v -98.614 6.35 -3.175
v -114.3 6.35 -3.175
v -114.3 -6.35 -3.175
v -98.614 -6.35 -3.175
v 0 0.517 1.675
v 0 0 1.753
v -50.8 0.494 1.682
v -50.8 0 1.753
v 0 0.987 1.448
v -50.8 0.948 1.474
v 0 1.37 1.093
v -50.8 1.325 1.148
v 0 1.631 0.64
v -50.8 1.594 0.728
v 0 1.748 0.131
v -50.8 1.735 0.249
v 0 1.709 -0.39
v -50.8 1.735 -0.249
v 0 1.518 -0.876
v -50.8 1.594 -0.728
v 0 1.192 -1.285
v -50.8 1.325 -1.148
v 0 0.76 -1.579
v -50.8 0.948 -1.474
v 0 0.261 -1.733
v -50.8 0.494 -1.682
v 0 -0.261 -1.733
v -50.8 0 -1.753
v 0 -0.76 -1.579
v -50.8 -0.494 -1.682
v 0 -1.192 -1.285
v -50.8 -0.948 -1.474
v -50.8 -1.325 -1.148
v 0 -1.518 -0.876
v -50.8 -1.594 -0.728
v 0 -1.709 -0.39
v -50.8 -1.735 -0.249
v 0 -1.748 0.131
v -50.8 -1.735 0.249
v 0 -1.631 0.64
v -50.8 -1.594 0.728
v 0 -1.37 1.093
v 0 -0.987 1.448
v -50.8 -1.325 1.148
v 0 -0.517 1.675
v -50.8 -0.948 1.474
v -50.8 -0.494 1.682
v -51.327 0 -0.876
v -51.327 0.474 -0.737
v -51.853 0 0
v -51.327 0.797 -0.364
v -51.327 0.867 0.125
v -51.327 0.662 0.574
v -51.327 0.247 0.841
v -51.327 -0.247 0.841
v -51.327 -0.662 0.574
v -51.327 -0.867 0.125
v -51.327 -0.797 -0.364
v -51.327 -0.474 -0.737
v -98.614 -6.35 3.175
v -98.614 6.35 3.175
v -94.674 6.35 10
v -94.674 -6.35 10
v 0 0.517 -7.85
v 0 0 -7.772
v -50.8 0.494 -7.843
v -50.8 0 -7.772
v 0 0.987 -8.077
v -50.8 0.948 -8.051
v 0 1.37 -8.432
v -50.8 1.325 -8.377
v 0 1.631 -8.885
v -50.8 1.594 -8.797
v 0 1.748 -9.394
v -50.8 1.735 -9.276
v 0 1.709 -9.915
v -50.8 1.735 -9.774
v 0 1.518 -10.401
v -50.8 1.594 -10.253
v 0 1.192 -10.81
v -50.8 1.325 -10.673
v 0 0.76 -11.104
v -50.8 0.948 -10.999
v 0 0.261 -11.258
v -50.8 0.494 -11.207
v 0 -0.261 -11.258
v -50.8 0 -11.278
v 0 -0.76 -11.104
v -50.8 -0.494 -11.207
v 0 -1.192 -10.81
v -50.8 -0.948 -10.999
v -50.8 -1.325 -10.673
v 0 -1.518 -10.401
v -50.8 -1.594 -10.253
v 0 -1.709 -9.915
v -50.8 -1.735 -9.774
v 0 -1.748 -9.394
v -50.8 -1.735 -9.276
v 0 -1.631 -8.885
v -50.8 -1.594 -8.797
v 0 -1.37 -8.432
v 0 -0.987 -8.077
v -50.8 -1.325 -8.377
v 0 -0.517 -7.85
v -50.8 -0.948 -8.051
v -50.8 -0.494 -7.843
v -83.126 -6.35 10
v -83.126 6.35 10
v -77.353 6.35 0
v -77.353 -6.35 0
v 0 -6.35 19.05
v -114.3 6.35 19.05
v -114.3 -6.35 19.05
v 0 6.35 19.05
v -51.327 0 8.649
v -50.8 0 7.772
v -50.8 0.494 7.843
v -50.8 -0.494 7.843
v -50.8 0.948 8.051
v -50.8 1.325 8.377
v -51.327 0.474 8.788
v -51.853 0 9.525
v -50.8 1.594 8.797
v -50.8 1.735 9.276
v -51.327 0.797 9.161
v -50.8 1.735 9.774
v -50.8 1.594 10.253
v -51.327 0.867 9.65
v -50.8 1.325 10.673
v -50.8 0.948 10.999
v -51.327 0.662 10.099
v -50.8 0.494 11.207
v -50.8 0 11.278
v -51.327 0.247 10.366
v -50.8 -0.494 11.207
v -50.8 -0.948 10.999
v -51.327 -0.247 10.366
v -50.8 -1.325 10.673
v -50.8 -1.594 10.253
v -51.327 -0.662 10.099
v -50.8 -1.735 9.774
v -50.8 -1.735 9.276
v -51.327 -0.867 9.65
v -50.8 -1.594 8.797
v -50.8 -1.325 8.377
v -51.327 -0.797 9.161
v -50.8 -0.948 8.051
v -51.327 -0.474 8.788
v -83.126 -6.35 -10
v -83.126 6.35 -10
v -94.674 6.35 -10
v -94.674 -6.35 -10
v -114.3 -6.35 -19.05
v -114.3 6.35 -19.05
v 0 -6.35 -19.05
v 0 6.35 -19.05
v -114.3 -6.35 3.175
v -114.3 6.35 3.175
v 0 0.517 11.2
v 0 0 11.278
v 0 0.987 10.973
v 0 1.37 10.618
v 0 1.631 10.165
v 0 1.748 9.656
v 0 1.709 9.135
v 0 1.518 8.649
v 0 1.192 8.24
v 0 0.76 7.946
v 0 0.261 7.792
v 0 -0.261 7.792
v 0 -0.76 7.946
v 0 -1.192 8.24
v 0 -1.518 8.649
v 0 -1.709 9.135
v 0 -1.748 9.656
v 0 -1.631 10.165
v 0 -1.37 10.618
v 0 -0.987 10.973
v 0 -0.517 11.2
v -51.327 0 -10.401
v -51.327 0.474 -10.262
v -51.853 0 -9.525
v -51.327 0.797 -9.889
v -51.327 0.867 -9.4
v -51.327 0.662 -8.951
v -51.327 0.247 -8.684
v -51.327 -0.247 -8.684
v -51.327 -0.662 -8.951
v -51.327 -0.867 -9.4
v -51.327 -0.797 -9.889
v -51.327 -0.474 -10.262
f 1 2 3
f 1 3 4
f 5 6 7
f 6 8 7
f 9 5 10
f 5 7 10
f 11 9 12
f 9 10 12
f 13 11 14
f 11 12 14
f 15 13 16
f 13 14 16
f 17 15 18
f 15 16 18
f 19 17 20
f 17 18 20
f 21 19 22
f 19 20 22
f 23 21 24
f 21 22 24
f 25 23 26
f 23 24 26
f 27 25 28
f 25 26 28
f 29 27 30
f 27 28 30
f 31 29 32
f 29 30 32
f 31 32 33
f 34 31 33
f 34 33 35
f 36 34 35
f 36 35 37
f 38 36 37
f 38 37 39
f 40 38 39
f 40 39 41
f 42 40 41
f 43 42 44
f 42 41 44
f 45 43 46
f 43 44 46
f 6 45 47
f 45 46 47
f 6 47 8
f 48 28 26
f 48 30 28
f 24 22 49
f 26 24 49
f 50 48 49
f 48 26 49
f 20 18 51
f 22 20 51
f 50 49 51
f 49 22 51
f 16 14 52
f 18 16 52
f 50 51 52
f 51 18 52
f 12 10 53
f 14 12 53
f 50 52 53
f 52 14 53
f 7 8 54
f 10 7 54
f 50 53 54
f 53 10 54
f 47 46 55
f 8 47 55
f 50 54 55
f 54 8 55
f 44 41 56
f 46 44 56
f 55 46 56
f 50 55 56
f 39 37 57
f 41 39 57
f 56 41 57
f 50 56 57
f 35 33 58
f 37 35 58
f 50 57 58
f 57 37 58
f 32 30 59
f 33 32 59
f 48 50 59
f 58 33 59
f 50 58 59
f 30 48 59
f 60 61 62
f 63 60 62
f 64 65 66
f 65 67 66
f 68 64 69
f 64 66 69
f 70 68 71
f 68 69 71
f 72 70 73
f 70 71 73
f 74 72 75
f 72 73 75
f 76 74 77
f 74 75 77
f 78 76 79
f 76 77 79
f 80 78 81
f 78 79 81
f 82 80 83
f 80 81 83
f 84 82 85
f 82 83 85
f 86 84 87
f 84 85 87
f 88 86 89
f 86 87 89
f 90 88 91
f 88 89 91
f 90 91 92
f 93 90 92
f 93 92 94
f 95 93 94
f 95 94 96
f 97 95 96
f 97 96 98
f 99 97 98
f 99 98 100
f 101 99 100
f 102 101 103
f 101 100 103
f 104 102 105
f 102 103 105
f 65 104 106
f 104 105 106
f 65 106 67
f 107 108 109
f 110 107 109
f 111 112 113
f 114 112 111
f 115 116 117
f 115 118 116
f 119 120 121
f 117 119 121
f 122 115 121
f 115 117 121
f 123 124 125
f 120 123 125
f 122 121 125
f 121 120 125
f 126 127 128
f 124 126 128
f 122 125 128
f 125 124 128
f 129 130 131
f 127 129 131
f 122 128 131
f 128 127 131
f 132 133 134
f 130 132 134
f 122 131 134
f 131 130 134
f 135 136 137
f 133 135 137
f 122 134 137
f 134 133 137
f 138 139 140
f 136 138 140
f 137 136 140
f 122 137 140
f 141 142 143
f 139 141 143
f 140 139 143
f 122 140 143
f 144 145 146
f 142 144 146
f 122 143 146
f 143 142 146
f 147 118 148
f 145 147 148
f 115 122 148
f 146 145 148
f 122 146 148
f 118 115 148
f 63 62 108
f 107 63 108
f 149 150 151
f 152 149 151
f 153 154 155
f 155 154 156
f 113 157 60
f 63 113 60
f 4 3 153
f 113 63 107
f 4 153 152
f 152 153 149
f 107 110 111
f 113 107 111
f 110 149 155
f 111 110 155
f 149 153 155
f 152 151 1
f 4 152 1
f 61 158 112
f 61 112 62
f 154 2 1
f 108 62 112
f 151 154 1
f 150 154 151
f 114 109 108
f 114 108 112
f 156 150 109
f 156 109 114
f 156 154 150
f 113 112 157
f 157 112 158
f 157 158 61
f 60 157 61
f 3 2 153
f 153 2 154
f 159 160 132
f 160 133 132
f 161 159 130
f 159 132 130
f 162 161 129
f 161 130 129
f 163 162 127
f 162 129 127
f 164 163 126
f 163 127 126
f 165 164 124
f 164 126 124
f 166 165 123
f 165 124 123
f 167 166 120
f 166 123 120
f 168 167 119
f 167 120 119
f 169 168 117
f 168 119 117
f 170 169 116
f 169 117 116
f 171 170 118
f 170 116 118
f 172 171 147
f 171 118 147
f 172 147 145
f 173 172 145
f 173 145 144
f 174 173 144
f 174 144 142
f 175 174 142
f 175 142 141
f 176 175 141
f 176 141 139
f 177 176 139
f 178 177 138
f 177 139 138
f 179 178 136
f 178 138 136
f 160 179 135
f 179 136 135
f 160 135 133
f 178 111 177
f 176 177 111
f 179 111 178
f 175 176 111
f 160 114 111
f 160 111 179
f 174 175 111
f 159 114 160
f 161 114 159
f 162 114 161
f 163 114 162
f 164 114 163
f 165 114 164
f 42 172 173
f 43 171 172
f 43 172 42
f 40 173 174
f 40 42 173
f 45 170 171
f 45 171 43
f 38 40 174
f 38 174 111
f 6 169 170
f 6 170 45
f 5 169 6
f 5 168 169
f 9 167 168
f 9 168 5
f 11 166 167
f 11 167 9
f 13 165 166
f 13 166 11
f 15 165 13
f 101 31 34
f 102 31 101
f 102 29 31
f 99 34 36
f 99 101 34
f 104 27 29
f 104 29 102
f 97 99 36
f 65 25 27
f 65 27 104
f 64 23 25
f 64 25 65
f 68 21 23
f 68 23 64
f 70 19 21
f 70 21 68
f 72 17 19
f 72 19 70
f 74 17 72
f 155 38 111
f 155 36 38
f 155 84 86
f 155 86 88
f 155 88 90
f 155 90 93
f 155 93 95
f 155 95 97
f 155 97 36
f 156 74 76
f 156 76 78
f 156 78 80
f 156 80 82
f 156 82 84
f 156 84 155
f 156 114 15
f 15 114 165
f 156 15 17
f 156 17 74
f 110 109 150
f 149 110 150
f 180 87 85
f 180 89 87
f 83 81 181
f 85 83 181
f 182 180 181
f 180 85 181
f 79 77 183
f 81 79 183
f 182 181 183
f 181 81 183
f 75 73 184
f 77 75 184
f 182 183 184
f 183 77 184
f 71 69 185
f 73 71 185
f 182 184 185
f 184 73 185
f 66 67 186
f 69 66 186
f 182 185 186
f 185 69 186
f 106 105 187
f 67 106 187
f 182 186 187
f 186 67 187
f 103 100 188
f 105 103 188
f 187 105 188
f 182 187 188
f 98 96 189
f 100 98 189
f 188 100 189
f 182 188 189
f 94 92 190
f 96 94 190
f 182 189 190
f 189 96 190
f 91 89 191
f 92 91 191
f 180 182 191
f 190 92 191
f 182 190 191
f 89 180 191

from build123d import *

# Parameters (mm, degrees)
SKETCH1_W                  = 114.3
SKETCH1_H                  = 38.1
BOSS_EXTRUDE1_DEPTH        = 6.35
F_6_32_THREADED_HOLE_D     = 3.5052
F_6_32_THREADED_HOLE_DEPTH = 50.8
F_6_32_THREADED_HOLE_TIP   = 1.053068321
CUT_EXTRUDE1_DEPTH         = 12.7
SKETCH8_W                  = 19.626497308
SKETCH8_H                  = 6.35
CUT_EXTRUDE2_DEPTH         = 117.570504417


with BuildPart() as part:
    # Sketch1 → Boss-Extrude1 (new, symmetric)
    with BuildSketch(Plane(origin=(0, 0, 0), x_dir=(1, 0, 0), z_dir=(0, 1, 0))):
        with Locations((-57.15, 0)):
            Rectangle(SKETCH1_W, SKETCH1_H)
    extrude(amount=BOSS_EXTRUDE1_DEPTH, both=True)

    # #6-32 Threaded Hole
    with Locations(Plane(origin=(0, 0, 0), x_dir=(0, 0, -1), z_dir=(1, 0, 0))):
        with Locations((0, 0), (9.525, 0), (-9.525, 0)):
            Hole(F_6_32_THREADED_HOLE_D / 2, depth=F_6_32_THREADED_HOLE_DEPTH)
            with Locations((0, 0, -(F_6_32_THREADED_HOLE_DEPTH + F_6_32_THREADED_HOLE_TIP / 2))):  # 118° drill point
                Cone(0, F_6_32_THREADED_HOLE_D / 2, F_6_32_THREADED_HOLE_TIP, mode=Mode.SUBTRACT)

    # Sketch5 → Cut-Extrude1 (cut)
    with BuildSketch(Plane(origin=(0, 6.35, 0), x_dir=(1, 0, 0), z_dir=(0, 1, 0))):
        Polygon((-83.126497308, -10), (-77.352994616, 0), (-83.126497308, 10), (-94.673502692, 10), (-100.447005384, 0), (-94.673502692, -10), align=None)
    extrude(amount=-CUT_EXTRUDE1_DEPTH, mode=Mode.SUBTRACT)

    # Sketch8 → Cut-Extrude2 (cut, through all)
    with BuildSketch(Plane(origin=(0, 6.35, 0), x_dir=(1, 0, 0), z_dir=(0, 1, 0))):
        with Locations((-104.486751346, 0)):
            Rectangle(SKETCH8_W, SKETCH8_H)
    extrude(amount=-CUT_EXTRUDE2_DEPTH, mode=Mode.SUBTRACT)


solid = part.part
